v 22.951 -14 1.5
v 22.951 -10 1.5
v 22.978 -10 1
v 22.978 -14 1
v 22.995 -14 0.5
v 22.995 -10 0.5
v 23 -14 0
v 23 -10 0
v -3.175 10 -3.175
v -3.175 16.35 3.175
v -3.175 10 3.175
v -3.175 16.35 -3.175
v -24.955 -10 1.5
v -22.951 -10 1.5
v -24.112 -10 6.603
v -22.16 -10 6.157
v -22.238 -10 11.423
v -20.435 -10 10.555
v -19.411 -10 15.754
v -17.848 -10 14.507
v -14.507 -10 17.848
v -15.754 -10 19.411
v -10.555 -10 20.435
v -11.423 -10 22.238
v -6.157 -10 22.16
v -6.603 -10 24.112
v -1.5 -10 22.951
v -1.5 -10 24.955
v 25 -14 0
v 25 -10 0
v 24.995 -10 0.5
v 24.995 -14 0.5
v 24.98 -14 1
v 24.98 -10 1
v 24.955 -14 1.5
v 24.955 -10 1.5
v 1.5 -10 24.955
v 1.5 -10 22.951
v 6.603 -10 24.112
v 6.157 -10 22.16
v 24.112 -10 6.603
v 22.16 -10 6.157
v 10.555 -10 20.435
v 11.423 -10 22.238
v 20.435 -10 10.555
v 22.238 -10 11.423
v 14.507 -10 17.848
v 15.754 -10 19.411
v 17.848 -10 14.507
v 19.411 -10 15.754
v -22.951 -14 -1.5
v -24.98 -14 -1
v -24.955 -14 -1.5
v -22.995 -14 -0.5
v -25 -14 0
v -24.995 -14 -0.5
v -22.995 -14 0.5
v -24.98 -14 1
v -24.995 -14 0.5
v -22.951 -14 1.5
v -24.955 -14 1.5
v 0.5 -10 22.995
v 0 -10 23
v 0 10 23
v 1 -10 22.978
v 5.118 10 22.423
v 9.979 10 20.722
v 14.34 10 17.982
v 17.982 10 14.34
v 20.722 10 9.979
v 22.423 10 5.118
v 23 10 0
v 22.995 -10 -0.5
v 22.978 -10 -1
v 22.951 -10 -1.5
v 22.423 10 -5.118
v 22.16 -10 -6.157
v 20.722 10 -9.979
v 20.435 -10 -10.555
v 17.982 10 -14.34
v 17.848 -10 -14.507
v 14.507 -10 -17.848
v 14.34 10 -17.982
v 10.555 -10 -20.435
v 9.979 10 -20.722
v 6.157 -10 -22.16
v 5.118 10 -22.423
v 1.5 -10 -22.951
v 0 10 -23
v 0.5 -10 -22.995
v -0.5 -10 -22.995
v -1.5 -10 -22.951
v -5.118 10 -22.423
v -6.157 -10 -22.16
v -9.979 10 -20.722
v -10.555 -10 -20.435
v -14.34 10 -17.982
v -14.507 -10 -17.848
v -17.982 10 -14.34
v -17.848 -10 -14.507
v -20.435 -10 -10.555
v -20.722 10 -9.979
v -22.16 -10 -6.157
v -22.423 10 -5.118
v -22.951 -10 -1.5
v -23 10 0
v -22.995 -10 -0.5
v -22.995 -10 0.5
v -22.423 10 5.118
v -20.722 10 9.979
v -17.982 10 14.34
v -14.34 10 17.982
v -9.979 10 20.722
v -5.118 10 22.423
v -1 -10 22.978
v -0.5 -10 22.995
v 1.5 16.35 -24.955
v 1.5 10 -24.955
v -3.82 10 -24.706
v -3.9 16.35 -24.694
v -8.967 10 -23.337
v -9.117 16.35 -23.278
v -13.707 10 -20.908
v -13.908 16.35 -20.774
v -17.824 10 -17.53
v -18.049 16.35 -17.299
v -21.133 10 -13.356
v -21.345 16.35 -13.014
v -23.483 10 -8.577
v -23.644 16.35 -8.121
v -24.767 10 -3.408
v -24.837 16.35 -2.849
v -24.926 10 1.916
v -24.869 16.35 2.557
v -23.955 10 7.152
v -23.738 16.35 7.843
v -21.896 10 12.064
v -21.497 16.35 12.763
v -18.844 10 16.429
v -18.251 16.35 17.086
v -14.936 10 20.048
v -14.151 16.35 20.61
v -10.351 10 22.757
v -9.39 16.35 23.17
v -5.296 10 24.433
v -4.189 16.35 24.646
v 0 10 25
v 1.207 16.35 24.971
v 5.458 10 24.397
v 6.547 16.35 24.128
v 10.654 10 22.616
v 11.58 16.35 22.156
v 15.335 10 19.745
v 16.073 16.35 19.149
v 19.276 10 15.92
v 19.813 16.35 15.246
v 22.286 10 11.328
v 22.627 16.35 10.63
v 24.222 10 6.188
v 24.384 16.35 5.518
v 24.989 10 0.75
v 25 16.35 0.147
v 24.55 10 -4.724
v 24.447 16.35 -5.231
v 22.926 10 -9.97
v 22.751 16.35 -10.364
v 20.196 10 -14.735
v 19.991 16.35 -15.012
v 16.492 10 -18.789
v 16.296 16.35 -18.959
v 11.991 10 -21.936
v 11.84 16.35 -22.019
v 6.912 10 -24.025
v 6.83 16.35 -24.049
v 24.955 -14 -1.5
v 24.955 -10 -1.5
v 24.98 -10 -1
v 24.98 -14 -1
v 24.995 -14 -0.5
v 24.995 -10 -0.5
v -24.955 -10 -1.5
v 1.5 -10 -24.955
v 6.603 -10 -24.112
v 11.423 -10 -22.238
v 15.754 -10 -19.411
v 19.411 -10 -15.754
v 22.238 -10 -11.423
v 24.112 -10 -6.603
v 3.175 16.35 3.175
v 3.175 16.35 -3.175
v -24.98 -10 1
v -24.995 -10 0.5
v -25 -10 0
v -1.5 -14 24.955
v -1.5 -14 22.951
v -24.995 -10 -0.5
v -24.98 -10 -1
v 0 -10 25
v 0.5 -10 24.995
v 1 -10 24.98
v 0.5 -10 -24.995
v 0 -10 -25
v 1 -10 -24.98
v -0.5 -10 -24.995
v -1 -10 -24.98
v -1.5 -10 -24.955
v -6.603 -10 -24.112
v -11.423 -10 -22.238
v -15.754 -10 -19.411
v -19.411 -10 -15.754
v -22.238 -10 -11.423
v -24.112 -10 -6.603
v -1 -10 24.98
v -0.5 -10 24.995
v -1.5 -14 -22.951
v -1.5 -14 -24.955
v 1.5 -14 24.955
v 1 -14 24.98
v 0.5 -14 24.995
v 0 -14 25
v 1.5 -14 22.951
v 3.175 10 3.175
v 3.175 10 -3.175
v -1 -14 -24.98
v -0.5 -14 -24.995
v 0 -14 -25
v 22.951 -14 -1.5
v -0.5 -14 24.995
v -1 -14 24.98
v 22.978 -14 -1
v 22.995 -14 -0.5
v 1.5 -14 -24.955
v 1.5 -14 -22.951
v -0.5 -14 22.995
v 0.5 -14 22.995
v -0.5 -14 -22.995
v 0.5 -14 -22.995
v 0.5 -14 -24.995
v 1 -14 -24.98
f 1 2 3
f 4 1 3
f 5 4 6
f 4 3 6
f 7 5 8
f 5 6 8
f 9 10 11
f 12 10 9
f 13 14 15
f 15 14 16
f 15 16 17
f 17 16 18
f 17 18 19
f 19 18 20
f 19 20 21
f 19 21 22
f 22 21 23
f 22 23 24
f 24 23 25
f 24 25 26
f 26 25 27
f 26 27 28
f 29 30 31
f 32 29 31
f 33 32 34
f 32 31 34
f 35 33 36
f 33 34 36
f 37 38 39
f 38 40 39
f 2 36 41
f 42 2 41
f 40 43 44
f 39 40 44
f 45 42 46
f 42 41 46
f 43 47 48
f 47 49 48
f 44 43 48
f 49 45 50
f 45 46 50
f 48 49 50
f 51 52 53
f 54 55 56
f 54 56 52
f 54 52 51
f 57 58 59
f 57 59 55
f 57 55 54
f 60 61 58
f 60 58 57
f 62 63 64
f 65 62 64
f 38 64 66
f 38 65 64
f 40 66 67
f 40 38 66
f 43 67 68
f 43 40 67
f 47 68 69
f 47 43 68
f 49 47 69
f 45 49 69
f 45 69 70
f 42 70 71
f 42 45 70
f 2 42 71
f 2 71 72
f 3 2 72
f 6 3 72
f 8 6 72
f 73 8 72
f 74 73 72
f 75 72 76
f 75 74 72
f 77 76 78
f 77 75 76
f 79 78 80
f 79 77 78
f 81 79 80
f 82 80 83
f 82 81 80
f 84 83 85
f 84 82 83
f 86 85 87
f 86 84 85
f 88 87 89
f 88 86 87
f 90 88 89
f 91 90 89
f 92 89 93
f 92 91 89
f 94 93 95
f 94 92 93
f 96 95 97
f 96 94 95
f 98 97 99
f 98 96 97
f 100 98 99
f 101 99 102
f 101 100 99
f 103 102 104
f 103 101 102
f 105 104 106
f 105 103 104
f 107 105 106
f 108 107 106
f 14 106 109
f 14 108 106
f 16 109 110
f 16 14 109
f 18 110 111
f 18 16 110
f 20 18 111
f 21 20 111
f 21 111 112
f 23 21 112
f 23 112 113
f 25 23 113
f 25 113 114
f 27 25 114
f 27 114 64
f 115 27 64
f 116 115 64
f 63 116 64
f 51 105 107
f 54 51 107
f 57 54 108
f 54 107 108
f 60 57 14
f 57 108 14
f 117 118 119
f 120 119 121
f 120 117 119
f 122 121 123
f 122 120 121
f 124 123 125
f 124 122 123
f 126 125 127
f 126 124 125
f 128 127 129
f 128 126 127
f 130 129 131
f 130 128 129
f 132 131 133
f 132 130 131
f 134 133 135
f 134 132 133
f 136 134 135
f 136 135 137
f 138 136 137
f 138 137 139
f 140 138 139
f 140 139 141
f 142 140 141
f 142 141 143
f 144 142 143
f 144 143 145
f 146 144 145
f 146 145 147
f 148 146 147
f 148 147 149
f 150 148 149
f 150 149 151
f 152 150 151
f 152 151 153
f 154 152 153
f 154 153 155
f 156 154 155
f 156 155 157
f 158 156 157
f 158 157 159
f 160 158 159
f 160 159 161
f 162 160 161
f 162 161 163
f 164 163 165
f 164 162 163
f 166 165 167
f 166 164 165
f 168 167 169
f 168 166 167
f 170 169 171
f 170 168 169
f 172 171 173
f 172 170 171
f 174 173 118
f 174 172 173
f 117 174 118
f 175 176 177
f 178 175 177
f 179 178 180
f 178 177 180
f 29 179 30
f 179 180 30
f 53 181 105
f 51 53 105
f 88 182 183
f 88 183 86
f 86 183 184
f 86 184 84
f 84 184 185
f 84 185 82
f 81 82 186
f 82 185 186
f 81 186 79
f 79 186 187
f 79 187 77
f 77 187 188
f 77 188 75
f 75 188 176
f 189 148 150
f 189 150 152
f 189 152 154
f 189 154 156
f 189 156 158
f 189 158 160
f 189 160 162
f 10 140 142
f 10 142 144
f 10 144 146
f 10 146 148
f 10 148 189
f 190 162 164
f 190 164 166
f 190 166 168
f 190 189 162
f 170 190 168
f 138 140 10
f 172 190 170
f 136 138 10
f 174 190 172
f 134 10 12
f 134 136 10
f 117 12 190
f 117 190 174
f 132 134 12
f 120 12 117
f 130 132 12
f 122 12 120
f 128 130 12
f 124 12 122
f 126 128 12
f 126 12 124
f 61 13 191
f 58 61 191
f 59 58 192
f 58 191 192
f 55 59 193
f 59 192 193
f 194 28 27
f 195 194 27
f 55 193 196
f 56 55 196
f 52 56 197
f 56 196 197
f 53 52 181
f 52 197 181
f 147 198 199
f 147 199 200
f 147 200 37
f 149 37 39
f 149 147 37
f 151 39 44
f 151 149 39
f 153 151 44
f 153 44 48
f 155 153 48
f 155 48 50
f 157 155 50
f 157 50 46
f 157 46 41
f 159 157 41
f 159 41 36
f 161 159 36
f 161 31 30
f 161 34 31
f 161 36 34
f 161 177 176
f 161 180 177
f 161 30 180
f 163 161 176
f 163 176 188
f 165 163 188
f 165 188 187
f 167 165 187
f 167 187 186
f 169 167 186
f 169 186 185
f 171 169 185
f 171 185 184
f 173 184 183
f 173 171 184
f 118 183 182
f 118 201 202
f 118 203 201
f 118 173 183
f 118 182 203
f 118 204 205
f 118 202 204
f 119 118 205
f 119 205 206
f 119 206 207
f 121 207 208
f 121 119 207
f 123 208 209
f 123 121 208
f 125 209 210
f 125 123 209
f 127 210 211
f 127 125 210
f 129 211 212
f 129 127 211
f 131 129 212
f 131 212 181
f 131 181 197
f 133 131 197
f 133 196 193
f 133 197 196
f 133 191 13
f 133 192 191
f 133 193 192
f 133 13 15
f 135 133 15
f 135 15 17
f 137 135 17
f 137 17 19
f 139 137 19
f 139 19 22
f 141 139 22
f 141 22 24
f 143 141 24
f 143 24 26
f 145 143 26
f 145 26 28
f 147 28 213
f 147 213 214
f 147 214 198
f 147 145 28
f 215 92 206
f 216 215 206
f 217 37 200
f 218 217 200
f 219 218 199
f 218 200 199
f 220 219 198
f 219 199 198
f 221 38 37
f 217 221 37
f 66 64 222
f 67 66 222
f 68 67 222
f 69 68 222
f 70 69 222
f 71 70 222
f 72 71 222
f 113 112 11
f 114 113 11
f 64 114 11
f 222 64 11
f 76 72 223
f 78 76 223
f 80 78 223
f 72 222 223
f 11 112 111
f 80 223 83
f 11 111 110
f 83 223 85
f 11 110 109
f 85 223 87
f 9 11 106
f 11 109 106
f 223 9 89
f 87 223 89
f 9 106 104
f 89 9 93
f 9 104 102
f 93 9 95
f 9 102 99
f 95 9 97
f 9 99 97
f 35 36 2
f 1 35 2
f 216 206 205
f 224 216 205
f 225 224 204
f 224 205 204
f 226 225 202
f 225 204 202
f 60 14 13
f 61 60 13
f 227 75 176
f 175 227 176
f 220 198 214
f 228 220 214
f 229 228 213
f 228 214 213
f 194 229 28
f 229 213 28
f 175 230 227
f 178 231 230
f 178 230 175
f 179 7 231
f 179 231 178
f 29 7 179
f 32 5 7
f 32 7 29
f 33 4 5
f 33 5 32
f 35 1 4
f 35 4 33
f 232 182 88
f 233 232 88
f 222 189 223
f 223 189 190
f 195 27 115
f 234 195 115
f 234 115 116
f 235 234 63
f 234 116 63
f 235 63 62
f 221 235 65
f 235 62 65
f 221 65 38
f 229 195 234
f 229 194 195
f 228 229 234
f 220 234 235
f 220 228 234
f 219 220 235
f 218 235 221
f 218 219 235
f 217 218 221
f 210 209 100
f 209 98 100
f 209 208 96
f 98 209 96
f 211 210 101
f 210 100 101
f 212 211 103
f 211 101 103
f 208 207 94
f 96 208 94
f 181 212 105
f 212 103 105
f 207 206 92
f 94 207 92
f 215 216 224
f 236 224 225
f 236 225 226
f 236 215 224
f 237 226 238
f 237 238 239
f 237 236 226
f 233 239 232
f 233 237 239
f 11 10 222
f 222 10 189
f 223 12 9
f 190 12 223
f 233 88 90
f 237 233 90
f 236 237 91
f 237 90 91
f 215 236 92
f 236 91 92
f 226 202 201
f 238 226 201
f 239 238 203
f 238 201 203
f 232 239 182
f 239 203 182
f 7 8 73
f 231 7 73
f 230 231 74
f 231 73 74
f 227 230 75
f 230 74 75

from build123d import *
from build123d.topology import SkipClean

# Parameters (mm, degrees)
SKETCH1_R           = 25
SKETCH1_R_2         = 23
BOSS_EXTRUDE1_DEPTH = 10
BOSS_EXTRUDE2_DEPTH = 4
BOSS_EXTRUDE3_START = 6.35
SKETCH3_R           = 25
SKETCH3_W           = 6.35
SKETCH3_H           = 6.35
BOSS_EXTRUDE3_DEPTH = 6.35


with BuildPart() as part:
    # Sketch1 → Boss-Extrude1 (new, symmetric)
    with BuildSketch(Plane(origin=(0, 0, 0), x_dir=(1, 0, 0), z_dir=(0, 1, 0))):
        with Locations(Location((0, 0, 0), (0, 0, 270))):
            Circle(SKETCH1_R)
        with Locations(Location((0, 0, 0), (0, 0, 270))):
            Circle(SKETCH1_R_2, mode=Mode.SUBTRACT)
    extrude(amount=BOSS_EXTRUDE1_DEPTH, both=True)

    # Sketch2 → Boss-Extrude2 (add)
    with SkipClean():  # the faces are left unmerged after this step: merging them gives an invalid solid
        with BuildSketch(Plane.XZ.offset(10)):
            with BuildLine():
                ThreePointArc((-1.5, 22.951034835), (0, 23), (1.5, 22.951034835))
                Line((1.5, 22.951034835), (1.5, 24.954959427))
                ThreePointArc((1.5, 24.954959427), (0.750338033, 24.98873732), (0, 25))
                ThreePointArc((0, 25), (-0.750338033, 24.98873732), (-1.5, 24.954959427))
                Line((-1.5, 24.954959427), (-1.5, 22.951034835))
            make_face()
            with BuildLine():
                Line((-24.954959427, -1.5), (-22.951034835, -1.5))
                ThreePointArc((-22.951034835, -1.5), (-23, 0), (-22.951034835, 1.5))
                Line((-22.951034835, 1.5), (-24.954959427, 1.5))
                ThreePointArc((-24.954959427, 1.5), (-24.98873732, 0.750338033), (-25, 0))
                ThreePointArc((-25, 0), (-24.98873732, -0.750338033), (-24.954959427, -1.5))
            make_face()
            with BuildLine():
                ThreePointArc((23, 0), (22.987755449, -0.750399492), (22.951034835, -1.5))
                Line((22.951034835, -1.5), (24.954959427, -1.5))
                ThreePointArc((24.954959427, -1.5), (24.98873732, -0.750338033), (25, 0))
                ThreePointArc((25, 0), (24.98873732, 0.750338033), (24.954959427, 1.5))
                Line((24.954959427, 1.5), (22.951034835, 1.5))
                ThreePointArc((22.951034835, 1.5), (22.987755449, 0.750399492), (23, 0))
            make_face()
            with BuildLine():
                Line((1.5, -24.954959427), (1.5, -22.951034835))
                ThreePointArc((1.5, -22.951034835), (0, -23), (-1.5, -22.951034835))
                Line((-1.5, -22.951034835), (-1.5, -24.954959427))
                ThreePointArc((-1.5, -24.954959427), (-0.750338033, -24.98873732), (0, -25))
                ThreePointArc((0, -25), (0.750338033, -24.98873732), (1.5, -24.954959427))
            make_face()
        extrude(amount=BOSS_EXTRUDE2_DEPTH)

    # Sketch3 → Boss-Extrude3 (add)
    with SkipClean():  # the faces are left unmerged after this step: merging them gives an invalid solid
        with BuildSketch(Plane(origin=(0, 10, 0), x_dir=(1, 0, 0), z_dir=(0, 1, 0)).offset(BOSS_EXTRUDE3_START)):
            with Locations(Location((0, 0, 0), (0, 0, 86.560187232))):
                Circle(SKETCH3_R)
            Rectangle(SKETCH3_W, SKETCH3_H, mode=Mode.SUBTRACT)
        extrude(amount=-BOSS_EXTRUDE3_DEPTH)


solid = part.part
